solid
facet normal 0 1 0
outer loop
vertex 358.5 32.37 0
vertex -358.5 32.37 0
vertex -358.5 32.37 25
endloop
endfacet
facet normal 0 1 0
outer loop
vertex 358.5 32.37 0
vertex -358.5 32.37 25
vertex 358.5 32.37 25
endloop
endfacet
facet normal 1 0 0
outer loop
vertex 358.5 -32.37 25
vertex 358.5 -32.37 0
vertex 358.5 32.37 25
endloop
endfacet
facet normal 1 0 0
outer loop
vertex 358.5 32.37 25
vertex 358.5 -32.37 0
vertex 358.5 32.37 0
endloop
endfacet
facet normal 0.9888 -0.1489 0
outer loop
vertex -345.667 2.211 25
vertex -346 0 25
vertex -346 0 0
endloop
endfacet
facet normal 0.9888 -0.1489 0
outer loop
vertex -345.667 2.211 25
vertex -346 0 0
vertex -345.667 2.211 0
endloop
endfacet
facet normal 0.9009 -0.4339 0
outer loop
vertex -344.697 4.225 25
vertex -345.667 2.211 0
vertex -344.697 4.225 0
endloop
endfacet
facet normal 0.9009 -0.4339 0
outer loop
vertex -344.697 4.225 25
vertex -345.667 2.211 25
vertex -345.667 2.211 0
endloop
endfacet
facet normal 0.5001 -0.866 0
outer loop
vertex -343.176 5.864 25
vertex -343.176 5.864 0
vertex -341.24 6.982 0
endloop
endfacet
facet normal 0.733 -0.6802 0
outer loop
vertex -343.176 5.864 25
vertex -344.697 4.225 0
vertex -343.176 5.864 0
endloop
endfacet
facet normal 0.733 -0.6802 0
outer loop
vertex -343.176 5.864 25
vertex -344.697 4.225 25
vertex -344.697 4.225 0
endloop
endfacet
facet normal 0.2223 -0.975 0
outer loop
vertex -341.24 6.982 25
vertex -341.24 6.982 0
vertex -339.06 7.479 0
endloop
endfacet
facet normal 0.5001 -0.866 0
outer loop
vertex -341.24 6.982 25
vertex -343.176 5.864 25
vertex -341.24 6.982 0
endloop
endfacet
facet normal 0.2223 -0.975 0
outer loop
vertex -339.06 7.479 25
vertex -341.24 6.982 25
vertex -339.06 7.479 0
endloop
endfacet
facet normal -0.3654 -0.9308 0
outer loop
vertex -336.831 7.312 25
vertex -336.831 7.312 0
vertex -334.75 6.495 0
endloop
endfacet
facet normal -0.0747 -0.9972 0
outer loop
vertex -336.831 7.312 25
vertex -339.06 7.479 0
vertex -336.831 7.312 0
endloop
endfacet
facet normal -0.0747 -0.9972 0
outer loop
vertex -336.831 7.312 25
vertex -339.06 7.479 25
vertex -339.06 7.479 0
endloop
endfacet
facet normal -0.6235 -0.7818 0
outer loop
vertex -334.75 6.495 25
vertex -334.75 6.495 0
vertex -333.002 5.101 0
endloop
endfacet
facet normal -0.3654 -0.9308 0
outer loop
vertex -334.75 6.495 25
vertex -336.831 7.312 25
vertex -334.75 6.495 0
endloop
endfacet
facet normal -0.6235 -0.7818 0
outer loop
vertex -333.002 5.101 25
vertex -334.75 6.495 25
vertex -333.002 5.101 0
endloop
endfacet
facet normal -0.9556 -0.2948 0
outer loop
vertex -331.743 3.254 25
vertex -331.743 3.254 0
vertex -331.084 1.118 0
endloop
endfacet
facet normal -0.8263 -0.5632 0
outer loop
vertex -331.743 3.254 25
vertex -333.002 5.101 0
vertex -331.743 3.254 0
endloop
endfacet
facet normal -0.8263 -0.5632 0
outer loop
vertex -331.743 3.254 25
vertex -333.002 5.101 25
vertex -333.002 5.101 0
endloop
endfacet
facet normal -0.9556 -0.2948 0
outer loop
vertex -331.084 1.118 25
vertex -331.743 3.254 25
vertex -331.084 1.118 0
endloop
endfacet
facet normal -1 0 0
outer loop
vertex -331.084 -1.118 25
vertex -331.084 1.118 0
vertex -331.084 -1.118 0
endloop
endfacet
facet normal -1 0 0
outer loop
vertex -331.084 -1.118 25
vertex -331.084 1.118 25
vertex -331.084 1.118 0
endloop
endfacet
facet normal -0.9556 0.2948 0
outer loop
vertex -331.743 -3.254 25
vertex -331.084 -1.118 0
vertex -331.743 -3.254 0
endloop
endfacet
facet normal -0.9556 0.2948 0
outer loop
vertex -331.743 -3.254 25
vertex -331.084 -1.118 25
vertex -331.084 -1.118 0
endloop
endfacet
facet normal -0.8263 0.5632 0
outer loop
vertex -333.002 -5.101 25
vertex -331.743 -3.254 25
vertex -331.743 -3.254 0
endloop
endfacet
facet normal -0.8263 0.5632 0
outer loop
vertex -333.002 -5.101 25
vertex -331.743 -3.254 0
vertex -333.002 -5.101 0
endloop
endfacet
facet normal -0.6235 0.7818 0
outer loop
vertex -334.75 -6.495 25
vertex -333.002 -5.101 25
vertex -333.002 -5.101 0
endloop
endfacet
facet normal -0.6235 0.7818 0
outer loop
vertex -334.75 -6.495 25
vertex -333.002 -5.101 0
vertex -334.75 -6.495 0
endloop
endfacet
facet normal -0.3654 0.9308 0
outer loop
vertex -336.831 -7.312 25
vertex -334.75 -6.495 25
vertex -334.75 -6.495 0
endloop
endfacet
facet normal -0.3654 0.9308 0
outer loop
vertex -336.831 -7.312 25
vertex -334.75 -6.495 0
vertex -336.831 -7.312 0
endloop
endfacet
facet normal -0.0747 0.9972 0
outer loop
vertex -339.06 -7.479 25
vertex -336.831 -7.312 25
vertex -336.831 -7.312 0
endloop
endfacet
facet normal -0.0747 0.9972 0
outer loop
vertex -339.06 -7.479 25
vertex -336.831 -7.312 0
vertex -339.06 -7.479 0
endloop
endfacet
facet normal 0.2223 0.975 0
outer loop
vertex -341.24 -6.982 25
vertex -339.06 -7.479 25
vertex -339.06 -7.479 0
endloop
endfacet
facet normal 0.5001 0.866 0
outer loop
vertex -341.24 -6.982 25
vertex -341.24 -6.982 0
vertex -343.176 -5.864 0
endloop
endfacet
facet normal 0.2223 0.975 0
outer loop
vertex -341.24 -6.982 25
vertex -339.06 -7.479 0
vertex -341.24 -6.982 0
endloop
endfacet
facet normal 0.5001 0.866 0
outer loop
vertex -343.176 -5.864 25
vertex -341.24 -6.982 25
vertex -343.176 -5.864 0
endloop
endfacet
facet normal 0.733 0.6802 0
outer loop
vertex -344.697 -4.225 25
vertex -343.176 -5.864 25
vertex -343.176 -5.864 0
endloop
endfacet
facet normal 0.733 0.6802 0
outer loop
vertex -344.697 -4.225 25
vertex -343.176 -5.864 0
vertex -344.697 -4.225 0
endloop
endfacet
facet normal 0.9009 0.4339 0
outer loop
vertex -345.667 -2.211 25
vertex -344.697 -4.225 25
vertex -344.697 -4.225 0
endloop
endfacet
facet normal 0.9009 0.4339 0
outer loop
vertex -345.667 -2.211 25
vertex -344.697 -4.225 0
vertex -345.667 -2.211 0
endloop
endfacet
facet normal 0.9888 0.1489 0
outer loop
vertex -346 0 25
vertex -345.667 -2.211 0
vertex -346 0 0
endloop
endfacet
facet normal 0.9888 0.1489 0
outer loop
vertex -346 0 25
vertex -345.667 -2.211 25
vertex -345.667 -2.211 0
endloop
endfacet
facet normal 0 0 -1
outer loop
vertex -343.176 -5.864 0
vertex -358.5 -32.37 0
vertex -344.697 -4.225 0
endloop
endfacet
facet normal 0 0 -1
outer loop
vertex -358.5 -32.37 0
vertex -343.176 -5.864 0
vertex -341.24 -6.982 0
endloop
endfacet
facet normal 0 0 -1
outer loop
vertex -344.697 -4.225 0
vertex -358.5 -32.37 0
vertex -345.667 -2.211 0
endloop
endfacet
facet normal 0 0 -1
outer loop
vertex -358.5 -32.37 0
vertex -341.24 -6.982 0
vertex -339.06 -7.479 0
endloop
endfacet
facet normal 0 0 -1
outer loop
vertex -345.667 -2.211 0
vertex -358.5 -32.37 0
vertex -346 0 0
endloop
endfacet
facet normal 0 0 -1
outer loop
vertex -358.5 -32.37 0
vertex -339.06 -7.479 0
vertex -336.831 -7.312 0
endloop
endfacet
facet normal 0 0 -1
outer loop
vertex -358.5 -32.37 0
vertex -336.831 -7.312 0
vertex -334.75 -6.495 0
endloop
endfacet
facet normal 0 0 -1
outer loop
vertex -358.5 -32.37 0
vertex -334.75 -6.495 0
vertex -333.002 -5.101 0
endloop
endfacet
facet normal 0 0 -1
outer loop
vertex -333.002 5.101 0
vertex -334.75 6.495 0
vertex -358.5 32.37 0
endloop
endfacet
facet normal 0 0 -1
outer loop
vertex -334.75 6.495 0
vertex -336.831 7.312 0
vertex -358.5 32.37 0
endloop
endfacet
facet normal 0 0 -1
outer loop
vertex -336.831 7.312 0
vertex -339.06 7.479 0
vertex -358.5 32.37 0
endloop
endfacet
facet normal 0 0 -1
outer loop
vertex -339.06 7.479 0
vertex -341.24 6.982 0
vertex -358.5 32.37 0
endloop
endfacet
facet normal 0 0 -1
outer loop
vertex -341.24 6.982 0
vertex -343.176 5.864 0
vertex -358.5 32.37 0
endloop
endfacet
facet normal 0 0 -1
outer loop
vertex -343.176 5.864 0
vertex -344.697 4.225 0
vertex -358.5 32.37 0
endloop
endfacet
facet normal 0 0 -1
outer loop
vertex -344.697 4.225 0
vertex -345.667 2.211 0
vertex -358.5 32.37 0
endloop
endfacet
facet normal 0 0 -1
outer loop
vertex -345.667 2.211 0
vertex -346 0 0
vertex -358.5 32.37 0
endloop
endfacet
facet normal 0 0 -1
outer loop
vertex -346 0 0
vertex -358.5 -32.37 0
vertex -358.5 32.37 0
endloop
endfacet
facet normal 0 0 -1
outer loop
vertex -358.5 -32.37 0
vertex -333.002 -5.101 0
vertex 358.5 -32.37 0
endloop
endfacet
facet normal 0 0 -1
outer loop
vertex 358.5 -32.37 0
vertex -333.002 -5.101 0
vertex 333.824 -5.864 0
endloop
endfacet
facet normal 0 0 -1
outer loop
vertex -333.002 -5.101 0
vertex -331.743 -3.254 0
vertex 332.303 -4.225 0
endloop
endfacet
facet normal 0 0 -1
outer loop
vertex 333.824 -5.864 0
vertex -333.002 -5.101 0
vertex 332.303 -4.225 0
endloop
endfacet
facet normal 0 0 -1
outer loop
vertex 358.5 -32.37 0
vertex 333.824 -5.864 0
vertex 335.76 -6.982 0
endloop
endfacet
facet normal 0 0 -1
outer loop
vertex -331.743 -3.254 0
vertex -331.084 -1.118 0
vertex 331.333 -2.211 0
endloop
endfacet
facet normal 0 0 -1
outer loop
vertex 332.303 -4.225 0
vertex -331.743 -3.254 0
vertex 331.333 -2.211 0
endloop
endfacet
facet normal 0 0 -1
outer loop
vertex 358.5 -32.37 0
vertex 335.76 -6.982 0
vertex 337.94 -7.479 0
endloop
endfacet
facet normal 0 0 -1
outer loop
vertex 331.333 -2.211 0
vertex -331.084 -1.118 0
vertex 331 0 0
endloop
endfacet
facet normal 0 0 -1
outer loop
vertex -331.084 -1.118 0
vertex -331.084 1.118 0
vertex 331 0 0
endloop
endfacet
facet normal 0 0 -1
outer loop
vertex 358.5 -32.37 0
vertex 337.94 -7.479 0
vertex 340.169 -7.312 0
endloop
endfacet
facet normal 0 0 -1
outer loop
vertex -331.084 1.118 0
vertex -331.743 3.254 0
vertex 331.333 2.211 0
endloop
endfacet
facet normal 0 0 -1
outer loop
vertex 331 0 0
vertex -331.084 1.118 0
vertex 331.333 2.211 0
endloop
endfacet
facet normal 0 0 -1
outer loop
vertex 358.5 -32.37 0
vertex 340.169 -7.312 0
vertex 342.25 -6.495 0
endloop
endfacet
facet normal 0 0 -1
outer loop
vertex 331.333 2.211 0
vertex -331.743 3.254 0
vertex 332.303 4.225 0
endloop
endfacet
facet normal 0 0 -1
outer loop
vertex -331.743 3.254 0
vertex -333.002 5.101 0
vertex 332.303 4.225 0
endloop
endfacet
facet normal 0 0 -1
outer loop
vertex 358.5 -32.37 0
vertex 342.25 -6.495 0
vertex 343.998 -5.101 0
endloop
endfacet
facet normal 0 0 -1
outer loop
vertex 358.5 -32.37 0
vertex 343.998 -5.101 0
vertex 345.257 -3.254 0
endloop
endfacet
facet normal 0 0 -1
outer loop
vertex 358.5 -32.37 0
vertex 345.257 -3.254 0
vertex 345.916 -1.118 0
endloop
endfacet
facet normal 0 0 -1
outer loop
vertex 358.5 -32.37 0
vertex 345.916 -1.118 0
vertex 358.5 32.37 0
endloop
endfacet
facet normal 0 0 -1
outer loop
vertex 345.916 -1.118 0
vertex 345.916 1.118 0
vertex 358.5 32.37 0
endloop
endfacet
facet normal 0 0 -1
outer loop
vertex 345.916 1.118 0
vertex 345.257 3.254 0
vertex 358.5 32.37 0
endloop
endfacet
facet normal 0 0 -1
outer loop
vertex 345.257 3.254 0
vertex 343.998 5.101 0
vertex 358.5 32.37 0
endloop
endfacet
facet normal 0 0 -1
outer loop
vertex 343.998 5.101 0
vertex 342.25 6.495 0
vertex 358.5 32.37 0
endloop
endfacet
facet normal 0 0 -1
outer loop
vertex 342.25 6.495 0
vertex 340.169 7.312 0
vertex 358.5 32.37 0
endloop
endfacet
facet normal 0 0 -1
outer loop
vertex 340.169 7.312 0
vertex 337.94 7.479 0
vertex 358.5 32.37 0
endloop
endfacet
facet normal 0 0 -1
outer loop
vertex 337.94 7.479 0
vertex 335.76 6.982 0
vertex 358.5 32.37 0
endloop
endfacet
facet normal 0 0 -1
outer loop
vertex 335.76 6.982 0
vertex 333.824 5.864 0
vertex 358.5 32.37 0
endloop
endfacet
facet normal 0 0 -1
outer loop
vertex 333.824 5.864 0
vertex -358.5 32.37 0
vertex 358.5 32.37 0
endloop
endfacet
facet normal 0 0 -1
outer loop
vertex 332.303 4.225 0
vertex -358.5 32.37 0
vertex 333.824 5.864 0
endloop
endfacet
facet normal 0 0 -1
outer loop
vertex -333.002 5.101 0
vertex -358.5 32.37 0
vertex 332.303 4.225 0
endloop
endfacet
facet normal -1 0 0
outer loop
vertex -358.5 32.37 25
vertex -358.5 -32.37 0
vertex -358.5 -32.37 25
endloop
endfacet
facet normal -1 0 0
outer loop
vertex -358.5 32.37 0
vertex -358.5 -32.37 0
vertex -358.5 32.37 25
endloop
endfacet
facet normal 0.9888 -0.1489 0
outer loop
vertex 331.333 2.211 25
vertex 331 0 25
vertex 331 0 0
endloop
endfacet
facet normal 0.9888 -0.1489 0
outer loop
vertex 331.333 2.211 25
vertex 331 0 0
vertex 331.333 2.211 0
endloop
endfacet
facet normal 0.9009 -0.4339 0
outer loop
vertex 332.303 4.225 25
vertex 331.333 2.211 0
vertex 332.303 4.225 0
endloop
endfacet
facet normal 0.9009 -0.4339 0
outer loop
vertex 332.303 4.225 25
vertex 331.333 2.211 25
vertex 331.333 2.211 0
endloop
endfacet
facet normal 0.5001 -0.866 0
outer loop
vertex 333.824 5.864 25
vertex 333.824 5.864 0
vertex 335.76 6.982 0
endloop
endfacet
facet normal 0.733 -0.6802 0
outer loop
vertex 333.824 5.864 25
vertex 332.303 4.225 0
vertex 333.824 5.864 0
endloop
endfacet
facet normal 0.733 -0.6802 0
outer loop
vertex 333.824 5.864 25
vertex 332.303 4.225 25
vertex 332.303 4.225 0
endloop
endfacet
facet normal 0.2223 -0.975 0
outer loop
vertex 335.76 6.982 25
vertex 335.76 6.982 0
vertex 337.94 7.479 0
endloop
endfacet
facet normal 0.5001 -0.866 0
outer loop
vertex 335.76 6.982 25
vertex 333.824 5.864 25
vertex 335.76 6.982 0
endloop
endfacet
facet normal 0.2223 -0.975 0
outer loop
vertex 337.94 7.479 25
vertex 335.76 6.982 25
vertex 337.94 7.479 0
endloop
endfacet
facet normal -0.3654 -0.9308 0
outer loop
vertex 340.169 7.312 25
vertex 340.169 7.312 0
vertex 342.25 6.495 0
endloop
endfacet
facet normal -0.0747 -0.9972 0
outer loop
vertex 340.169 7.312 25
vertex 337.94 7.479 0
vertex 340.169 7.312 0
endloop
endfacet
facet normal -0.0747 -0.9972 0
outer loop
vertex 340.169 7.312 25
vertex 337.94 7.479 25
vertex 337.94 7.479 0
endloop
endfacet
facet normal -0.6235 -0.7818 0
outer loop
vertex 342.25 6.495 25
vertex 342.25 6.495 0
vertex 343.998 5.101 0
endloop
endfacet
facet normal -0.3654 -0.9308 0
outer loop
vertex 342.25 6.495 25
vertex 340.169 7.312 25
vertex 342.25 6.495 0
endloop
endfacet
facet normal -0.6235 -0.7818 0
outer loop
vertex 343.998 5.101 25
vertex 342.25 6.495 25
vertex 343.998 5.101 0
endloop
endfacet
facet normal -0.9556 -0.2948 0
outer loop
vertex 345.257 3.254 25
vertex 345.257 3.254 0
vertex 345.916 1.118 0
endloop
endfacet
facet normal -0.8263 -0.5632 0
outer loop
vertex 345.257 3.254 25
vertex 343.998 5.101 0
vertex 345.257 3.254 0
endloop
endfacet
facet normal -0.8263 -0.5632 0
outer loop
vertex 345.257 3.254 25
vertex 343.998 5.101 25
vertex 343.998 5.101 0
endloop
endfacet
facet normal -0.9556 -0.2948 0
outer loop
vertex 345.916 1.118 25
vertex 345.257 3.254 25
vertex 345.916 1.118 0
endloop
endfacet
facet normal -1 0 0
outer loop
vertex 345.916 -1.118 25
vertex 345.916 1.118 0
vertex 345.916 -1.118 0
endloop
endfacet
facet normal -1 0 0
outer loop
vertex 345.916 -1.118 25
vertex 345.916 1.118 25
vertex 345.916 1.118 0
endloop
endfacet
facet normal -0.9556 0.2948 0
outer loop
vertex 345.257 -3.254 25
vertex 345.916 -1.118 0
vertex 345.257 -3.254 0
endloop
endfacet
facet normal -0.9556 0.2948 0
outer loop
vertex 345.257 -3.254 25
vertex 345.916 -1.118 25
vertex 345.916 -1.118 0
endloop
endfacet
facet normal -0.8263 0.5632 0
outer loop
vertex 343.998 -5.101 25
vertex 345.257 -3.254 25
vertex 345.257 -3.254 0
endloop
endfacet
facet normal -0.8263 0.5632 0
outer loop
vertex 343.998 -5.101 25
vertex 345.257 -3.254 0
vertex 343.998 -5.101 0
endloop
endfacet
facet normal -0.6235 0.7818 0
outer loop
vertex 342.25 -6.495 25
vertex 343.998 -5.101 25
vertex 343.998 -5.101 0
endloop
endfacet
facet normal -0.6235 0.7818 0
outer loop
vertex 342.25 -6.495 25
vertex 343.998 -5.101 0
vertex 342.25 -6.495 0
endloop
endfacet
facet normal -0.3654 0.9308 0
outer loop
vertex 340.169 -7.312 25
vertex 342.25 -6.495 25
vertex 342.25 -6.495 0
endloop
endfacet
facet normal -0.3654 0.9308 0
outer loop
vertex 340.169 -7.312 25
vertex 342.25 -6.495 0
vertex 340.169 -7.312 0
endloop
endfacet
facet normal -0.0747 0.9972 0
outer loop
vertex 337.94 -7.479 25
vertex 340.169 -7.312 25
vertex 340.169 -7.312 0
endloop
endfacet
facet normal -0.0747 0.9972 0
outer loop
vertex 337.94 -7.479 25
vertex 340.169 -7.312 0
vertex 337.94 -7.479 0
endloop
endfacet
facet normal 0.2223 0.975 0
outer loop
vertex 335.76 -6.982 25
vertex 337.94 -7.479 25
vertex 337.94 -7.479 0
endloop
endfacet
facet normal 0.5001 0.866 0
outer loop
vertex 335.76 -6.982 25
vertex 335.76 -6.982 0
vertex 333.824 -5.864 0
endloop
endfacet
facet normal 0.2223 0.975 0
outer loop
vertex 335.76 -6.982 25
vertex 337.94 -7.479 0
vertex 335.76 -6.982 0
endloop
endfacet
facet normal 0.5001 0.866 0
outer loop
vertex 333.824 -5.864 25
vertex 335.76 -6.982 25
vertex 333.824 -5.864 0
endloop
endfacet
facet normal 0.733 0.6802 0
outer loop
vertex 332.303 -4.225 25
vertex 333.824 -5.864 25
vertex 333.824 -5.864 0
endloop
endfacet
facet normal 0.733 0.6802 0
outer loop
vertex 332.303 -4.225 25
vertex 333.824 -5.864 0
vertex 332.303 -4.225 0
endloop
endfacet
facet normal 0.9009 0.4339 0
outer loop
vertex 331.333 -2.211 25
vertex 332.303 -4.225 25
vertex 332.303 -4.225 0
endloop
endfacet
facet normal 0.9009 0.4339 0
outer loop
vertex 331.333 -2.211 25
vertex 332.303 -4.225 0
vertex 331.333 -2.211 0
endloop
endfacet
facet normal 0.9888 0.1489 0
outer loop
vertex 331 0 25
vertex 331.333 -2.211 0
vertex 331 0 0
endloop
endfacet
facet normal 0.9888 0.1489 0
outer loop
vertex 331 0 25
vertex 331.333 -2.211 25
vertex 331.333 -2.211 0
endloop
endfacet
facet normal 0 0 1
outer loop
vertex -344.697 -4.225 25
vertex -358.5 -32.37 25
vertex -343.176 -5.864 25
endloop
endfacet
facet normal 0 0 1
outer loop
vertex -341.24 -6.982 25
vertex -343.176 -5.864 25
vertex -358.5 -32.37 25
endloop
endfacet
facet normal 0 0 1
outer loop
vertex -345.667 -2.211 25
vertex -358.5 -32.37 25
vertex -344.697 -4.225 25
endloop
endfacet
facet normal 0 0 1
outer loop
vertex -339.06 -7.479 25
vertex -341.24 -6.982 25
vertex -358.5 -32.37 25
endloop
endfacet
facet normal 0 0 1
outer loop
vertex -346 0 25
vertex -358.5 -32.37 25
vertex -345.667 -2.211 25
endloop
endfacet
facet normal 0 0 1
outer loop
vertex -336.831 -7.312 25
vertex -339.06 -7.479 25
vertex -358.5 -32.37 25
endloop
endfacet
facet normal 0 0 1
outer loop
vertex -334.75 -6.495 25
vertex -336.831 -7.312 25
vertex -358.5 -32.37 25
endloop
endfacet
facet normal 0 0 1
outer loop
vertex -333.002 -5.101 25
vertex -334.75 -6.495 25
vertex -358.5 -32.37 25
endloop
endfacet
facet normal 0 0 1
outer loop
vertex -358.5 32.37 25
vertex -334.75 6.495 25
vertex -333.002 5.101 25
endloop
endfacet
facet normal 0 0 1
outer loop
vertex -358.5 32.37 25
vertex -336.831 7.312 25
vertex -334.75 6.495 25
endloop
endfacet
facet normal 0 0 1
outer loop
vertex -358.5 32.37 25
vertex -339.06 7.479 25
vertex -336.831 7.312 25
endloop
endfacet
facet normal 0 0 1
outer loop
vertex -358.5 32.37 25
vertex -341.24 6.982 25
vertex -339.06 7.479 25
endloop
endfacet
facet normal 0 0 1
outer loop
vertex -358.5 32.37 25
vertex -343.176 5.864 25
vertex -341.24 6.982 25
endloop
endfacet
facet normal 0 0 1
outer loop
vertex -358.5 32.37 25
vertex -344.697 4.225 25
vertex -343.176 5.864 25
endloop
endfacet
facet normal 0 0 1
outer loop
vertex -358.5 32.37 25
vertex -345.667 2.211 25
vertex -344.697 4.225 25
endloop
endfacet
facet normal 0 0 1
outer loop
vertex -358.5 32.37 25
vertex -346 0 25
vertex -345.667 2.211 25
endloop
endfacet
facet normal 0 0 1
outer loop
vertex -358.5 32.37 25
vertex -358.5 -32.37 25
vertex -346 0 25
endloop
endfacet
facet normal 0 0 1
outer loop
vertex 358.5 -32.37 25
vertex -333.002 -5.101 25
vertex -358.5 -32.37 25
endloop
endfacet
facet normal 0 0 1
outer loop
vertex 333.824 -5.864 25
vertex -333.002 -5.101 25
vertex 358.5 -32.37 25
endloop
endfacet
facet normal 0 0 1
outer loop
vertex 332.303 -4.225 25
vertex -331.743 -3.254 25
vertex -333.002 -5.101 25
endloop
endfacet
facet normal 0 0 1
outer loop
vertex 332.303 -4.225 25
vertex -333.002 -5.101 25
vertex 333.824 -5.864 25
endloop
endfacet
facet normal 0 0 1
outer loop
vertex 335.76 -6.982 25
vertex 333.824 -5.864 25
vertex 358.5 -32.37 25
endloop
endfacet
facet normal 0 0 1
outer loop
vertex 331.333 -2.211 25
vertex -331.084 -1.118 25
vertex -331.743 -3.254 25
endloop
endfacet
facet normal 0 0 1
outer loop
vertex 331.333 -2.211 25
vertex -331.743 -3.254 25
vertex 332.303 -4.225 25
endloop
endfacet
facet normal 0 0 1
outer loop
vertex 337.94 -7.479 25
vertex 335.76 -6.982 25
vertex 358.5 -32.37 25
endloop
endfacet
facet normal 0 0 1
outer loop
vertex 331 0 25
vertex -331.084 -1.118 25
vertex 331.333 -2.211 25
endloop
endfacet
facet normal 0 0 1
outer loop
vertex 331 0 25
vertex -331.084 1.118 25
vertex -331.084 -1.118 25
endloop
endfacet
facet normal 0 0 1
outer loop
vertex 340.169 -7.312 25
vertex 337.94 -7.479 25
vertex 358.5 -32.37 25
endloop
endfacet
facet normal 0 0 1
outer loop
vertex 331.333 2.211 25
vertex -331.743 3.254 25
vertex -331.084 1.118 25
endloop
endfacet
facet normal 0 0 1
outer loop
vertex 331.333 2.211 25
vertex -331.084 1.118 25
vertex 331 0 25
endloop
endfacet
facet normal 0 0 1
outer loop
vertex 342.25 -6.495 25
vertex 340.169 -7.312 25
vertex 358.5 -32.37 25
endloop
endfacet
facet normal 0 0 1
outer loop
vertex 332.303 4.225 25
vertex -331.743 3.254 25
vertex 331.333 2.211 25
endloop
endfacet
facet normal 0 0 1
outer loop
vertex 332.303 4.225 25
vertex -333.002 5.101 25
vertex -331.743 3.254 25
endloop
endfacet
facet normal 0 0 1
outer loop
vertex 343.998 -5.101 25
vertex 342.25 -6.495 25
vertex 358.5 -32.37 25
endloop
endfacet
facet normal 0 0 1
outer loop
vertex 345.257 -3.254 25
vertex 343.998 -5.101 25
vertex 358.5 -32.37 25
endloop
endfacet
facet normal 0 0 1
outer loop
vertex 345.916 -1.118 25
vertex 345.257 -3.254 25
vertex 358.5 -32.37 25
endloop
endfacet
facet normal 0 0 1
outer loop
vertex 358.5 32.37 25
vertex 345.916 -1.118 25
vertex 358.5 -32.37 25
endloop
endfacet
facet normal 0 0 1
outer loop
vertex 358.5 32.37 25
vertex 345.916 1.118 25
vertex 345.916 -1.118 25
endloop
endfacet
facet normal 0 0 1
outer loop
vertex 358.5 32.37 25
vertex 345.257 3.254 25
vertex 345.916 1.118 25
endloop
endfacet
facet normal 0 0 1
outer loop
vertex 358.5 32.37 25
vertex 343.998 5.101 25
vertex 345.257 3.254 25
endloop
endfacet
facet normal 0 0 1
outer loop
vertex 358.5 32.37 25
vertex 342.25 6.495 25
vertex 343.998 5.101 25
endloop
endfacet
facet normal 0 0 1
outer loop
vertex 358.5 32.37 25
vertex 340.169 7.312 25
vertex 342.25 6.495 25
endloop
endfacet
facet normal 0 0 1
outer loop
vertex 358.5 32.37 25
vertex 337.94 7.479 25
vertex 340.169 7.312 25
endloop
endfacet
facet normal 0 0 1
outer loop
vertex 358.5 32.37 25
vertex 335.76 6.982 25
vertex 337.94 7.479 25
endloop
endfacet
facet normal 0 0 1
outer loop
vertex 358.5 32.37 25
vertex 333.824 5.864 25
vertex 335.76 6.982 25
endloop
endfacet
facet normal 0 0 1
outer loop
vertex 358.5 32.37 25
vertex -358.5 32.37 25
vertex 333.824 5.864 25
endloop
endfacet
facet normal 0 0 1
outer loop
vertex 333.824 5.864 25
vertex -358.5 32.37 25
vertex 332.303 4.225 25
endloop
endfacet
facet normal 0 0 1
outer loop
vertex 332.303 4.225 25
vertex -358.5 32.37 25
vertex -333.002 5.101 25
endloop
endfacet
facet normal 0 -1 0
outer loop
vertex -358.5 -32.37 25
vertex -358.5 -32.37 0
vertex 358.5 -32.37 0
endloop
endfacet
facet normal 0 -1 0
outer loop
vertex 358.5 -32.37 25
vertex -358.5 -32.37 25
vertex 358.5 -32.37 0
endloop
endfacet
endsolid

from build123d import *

# Parameters (mm, degrees)
SKETCH1_W               = 717
SKETCH1_H               = 64.740437158
BOSS_EXTRUDE1_DEPTH     = 25
CUT_EXTRUDE1_DEPTH      = 361.825554875
CUT_EXTRUDE1_DEPTH_BACK = 361.825554875
SKETCH2_R               = 7.5


with BuildPart() as part:
    # Sketch1 → Boss-Extrude1 (new body)
    with BuildSketch(Plane.XY):
        Rectangle(SKETCH1_W, SKETCH1_H)
    extrude(amount=BOSS_EXTRUDE1_DEPTH)

    # Sketch2 → Cut-Extrude1 (cut, two sides: drawn at the far end of the back side and taken through both)
    with BuildSketch(Plane(origin=(0, 0, 0), x_dir=(-1, 0, 0), z_dir=(0, 0, -1)).offset(-CUT_EXTRUDE1_DEPTH_BACK)):
        with Locations((-338.5, 0)):
            Circle(SKETCH2_R)
        with Locations((338.5, 0)):
            Circle(SKETCH2_R)
    extrude(amount=CUT_EXTRUDE1_DEPTH + CUT_EXTRUDE1_DEPTH_BACK, mode=Mode.SUBTRACT)


solid = part.part
